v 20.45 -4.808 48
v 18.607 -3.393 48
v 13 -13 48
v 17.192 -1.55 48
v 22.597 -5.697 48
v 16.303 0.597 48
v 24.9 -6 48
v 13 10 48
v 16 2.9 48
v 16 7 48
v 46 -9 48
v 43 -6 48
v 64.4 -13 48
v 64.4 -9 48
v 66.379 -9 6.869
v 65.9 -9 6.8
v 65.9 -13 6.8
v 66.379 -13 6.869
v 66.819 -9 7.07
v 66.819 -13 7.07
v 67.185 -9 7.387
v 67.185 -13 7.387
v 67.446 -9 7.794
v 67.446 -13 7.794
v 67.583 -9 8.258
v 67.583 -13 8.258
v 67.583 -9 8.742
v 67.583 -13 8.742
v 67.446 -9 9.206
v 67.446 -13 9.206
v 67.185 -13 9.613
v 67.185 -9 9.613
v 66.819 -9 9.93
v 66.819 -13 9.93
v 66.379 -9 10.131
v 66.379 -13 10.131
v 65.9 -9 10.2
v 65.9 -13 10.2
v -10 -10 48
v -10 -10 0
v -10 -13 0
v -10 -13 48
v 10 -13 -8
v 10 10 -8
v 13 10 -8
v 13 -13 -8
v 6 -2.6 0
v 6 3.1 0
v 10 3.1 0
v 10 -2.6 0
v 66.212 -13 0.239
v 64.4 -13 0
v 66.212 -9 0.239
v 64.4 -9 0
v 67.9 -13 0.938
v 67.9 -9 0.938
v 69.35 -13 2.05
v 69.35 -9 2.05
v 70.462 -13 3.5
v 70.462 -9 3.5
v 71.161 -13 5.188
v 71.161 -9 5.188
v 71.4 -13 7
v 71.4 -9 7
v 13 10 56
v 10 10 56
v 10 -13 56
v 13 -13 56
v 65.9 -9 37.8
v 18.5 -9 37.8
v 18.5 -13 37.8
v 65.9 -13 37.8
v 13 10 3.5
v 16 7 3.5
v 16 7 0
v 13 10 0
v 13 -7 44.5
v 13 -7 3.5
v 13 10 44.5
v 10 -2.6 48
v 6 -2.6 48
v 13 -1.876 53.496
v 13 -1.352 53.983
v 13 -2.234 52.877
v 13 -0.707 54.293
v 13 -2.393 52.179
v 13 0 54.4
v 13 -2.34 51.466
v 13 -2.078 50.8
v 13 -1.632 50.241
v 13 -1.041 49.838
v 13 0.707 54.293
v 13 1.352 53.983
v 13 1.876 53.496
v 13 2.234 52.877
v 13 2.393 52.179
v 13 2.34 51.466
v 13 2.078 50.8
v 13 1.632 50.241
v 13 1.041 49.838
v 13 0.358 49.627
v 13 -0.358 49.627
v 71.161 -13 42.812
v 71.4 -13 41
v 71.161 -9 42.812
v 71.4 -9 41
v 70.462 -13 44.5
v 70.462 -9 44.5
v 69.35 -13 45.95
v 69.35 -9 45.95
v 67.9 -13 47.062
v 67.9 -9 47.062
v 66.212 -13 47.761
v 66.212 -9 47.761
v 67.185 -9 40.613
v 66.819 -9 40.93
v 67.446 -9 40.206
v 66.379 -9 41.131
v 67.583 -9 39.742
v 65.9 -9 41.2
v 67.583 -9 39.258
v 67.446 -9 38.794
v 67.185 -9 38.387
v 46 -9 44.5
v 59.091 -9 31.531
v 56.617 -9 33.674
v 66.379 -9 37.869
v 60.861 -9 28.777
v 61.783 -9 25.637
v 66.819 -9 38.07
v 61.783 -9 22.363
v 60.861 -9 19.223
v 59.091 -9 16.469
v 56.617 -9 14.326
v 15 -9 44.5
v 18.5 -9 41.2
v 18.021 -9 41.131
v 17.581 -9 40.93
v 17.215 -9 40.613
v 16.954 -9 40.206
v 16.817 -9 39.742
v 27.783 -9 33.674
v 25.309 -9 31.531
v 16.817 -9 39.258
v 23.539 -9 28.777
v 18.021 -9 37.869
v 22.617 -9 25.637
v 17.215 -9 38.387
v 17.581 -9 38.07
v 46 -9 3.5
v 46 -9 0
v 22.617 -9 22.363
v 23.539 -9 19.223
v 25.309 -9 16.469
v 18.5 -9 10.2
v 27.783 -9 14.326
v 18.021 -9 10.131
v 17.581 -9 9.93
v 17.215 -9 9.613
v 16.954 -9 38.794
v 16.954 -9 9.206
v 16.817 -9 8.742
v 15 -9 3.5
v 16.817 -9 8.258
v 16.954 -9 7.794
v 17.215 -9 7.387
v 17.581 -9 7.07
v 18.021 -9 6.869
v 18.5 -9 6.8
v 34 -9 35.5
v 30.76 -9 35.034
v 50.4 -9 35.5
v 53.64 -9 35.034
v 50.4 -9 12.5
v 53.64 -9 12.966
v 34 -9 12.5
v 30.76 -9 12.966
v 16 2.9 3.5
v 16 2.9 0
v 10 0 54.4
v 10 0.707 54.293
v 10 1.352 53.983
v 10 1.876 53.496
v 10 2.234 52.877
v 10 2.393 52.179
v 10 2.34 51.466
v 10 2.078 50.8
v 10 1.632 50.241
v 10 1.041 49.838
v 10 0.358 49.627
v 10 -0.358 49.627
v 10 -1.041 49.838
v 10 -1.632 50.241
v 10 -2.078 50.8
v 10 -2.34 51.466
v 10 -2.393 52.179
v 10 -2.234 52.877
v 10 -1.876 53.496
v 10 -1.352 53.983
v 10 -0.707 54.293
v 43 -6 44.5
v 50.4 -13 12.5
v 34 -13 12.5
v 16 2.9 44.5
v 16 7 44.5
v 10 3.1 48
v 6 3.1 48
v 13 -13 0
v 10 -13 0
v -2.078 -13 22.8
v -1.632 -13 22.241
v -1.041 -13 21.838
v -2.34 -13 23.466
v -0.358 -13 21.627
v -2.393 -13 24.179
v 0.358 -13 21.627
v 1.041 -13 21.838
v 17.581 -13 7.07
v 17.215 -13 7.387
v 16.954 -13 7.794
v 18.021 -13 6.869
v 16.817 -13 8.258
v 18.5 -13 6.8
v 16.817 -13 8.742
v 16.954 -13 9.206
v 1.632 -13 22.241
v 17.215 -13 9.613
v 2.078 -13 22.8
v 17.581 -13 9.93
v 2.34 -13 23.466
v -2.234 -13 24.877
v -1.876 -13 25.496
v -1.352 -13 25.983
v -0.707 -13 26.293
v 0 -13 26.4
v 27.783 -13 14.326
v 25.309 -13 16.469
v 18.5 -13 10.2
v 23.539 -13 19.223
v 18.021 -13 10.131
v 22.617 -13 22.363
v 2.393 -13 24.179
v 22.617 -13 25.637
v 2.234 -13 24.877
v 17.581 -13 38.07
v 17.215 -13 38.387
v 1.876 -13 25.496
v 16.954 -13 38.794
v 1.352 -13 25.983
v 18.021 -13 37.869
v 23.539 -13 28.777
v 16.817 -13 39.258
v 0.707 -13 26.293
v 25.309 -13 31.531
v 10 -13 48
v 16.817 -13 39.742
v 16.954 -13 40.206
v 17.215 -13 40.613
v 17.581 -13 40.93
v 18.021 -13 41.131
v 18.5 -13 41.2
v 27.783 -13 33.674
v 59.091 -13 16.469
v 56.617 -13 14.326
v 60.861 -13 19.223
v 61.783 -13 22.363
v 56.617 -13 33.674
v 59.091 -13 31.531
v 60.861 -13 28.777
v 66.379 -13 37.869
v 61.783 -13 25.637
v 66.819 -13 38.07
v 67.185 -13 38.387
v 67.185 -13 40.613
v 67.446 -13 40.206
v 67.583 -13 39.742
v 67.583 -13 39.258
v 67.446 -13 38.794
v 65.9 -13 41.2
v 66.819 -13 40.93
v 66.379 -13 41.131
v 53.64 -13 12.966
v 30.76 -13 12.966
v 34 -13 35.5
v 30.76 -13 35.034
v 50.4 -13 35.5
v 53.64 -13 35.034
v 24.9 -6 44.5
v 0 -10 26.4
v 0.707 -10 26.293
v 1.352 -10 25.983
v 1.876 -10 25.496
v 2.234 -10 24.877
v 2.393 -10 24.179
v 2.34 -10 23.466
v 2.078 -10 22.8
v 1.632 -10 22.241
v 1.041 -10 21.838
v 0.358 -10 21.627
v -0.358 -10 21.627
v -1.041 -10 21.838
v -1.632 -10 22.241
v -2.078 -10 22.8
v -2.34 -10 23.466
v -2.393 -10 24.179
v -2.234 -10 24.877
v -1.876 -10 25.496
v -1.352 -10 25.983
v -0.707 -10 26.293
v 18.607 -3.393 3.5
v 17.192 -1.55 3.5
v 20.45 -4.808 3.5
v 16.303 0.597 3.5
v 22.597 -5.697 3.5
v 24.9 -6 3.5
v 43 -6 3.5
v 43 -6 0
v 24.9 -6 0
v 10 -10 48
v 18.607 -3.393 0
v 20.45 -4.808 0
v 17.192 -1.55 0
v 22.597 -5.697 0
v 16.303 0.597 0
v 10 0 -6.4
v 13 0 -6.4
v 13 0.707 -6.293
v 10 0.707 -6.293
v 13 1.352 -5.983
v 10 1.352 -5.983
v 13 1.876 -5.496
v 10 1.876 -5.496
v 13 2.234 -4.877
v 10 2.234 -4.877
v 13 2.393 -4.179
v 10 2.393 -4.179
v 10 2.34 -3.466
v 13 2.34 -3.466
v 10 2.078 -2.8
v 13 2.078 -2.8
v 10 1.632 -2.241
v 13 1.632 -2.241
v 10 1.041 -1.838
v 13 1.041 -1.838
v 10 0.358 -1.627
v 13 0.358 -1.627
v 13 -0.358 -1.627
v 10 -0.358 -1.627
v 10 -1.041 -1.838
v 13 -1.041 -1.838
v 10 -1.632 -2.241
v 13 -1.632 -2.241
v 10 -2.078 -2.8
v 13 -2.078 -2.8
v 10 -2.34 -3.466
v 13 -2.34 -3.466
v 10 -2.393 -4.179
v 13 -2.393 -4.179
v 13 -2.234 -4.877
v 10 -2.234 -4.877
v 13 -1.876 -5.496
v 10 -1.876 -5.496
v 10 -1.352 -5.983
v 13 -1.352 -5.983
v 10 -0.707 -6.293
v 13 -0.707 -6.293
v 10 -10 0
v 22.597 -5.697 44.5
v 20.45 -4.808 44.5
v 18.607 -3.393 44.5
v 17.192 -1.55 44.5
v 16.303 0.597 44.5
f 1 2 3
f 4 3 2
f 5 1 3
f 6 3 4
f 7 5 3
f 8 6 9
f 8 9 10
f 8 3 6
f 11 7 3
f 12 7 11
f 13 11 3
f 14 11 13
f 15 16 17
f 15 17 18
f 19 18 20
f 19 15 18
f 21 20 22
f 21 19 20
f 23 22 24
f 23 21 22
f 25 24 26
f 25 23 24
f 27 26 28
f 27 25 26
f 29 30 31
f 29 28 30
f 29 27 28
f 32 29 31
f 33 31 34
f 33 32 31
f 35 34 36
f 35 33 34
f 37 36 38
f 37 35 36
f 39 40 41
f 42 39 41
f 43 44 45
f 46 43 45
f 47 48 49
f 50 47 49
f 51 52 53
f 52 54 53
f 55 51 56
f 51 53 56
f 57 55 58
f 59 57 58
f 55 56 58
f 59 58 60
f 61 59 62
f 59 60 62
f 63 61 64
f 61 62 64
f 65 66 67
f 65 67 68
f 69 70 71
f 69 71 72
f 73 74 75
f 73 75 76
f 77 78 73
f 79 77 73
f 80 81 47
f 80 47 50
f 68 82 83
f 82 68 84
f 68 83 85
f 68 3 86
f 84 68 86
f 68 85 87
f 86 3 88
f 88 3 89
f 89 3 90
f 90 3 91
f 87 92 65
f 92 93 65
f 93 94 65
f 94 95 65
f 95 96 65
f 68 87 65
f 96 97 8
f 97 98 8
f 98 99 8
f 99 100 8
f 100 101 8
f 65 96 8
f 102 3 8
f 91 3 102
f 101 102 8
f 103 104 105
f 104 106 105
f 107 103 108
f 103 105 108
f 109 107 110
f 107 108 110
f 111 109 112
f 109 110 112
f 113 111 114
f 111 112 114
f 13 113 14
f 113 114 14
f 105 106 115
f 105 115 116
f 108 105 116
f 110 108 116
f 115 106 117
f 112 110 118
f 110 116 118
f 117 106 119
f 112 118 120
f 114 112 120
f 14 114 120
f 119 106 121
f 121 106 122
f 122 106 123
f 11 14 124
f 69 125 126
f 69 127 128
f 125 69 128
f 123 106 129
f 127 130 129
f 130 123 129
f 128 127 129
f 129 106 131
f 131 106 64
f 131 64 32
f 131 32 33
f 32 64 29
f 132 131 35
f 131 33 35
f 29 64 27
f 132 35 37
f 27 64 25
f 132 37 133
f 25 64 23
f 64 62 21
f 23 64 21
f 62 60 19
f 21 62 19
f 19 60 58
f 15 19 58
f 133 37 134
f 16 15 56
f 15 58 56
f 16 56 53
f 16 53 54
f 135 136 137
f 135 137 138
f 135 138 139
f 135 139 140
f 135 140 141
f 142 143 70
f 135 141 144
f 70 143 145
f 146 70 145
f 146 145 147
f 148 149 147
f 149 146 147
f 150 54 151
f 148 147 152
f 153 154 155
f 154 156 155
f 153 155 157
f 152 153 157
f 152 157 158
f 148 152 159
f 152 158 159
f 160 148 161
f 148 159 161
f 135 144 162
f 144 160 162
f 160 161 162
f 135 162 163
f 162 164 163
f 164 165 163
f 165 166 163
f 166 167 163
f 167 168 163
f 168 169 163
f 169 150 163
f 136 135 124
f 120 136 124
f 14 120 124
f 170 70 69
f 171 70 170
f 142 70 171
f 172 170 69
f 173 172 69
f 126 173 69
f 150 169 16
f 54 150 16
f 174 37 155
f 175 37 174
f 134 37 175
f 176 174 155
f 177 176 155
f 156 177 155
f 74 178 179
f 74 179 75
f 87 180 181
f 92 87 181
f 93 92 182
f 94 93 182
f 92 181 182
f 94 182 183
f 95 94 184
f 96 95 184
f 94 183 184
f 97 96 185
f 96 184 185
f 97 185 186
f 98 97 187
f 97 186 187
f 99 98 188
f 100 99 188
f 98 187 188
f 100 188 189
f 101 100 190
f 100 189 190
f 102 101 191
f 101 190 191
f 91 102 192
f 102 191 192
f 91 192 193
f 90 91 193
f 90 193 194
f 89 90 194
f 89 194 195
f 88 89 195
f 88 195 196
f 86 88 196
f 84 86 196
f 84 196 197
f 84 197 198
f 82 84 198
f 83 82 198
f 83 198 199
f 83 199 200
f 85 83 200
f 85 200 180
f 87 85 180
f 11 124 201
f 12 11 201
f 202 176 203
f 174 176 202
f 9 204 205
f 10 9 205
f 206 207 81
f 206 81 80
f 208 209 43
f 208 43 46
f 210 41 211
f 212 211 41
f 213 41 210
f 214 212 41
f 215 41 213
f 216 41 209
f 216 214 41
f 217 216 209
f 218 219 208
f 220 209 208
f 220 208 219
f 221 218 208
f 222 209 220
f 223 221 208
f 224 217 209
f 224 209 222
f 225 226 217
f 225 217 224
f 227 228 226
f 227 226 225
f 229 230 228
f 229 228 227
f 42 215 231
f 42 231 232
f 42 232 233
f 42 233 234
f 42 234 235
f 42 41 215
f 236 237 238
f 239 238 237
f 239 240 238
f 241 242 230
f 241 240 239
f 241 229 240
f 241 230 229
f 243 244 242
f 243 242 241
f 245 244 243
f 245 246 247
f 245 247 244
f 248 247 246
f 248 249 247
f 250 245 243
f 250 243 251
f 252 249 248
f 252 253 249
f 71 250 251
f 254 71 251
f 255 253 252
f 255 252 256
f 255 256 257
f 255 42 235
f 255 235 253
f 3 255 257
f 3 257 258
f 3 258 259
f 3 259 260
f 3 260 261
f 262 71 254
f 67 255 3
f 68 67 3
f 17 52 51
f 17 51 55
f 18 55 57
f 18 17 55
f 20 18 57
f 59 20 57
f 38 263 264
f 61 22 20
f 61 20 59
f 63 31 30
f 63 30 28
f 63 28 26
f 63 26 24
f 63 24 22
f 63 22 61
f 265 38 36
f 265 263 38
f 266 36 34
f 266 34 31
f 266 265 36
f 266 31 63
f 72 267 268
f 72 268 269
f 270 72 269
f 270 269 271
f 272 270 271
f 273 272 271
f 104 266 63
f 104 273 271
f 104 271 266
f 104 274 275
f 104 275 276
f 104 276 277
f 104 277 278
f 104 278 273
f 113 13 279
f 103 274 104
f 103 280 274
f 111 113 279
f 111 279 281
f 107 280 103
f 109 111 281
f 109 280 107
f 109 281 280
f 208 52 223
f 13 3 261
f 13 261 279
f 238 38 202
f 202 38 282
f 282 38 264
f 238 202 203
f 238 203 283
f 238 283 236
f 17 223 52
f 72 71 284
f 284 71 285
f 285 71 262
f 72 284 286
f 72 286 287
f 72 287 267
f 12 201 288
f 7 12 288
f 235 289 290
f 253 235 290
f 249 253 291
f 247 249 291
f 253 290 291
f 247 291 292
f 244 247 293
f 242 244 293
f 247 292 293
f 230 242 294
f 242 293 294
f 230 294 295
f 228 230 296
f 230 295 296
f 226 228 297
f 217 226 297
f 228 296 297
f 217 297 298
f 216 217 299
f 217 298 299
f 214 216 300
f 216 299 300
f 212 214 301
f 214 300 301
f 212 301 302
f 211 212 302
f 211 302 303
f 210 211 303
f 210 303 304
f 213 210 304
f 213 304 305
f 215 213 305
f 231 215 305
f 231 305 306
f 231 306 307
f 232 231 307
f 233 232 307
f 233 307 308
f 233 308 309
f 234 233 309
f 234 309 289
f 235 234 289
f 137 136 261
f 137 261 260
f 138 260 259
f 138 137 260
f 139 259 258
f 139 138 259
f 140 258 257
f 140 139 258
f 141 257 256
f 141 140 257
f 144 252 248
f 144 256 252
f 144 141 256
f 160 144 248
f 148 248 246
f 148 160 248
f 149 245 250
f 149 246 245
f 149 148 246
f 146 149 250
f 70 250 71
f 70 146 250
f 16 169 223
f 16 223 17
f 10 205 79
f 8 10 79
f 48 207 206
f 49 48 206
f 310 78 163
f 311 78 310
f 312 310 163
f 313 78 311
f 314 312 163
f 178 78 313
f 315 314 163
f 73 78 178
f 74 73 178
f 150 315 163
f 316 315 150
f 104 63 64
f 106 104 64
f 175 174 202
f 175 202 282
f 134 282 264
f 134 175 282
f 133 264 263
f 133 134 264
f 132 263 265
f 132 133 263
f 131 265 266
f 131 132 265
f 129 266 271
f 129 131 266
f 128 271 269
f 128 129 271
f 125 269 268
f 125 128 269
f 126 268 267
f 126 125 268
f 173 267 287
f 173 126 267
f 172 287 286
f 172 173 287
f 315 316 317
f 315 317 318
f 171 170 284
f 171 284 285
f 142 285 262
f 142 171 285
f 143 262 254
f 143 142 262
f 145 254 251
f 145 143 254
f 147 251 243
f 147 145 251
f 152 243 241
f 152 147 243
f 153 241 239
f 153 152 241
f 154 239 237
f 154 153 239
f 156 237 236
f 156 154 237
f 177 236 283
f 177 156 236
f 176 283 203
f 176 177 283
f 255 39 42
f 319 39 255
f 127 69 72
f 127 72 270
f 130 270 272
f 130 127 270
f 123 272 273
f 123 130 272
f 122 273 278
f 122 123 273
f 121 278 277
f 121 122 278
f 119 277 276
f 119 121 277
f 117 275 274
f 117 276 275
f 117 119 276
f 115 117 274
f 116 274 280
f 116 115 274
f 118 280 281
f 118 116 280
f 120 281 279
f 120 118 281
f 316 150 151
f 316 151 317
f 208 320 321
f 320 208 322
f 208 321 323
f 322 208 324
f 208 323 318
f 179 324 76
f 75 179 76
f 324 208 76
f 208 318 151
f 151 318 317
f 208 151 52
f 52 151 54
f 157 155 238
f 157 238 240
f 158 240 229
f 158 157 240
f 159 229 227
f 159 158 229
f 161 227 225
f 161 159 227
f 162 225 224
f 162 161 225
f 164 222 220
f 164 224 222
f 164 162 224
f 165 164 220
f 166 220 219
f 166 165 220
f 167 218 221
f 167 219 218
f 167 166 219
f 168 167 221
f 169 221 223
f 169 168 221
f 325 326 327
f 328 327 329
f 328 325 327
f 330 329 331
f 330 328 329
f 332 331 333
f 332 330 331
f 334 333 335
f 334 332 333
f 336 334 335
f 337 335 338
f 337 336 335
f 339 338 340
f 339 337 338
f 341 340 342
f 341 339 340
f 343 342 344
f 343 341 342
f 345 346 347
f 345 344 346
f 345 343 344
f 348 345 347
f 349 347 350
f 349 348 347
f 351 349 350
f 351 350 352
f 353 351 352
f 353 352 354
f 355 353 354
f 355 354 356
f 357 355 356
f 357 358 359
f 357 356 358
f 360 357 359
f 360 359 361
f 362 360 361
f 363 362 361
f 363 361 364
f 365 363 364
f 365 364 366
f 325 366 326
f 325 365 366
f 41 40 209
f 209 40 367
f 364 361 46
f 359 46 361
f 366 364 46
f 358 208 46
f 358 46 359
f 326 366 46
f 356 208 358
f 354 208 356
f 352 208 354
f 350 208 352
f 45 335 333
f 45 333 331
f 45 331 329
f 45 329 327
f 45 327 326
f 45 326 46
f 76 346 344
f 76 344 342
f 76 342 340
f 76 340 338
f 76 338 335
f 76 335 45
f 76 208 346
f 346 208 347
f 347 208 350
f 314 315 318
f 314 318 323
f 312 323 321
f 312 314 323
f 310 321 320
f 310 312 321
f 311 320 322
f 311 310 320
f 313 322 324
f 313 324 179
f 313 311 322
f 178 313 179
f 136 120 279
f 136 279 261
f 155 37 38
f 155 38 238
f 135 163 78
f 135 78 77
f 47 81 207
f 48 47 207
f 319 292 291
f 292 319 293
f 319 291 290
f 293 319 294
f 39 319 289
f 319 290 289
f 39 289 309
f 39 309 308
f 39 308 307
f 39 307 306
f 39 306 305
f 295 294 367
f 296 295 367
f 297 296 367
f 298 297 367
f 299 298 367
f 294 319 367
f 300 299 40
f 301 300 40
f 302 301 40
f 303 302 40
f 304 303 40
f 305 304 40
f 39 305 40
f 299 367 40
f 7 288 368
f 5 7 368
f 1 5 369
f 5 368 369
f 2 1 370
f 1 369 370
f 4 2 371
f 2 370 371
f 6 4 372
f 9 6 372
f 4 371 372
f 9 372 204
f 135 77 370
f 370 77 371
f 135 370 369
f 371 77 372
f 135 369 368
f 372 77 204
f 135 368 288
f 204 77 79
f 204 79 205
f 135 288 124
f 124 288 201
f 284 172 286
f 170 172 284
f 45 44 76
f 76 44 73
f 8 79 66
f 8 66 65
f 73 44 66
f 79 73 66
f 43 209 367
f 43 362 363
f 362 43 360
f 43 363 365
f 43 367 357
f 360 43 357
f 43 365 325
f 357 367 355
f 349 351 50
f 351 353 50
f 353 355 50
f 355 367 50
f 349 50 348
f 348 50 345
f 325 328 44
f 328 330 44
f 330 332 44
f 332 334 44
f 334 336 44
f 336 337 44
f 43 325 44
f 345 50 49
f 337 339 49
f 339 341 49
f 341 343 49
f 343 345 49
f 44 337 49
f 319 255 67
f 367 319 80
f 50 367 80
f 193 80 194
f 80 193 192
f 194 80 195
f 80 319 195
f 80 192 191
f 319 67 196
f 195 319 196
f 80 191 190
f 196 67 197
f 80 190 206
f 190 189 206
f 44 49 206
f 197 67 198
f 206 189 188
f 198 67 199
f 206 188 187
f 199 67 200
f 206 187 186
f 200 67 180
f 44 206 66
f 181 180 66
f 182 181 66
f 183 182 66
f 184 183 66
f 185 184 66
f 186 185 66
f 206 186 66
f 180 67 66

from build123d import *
from OCP.BRepFilletAPI import BRepFilletAPI_MakeChamfer

# Parameters (mm, degrees)
EXTRUDE_1_DEPTH     = 48
SKETCH_3_R          = 2.4
CUT_EXTRUDE_2_DEPTH = 89.328704281
CUT_EXTRUDE_3_REACH = 90.108
CHAMFER_1_SIZE      = 0.2
FILLET_1_R          = 7
CUT_EXTRUDE_4_DEPTH = 88.011263639
FILLET_2_R          = 4
RIB_START           = -3.5
RIB_2_DEPTH         = 3.5
CHAMFER_2_SIZE      = 0.8
CHAMFER_2_SIZE2     = 0.291176187
CHAMFER_3_SIZE      = 0.8
CHAMFER_3_SIZE2     = 0.291176187
CHAMFER_4_SIZE      = 2
SKETCH_21_W         = 8.512208597
SKETCH_21_H         = 13.260826712
CUT_EXTRUDE_5_DEPTH = 88.011263639
SKETCH_22_W         = 4
SKETCH_22_H         = 5.7
EXTRUDE_4_DEPTH     = 48
SKETCH_23_W         = 3
SKETCH_23_H         = 23
EXTRUDE_5_DEPTH     = 8
SKETCH_25_R         = 2.4
CUT_EXTRUDE_6_DEPTH = 85.112781431


# Read off the part's stored shape, not the designer's step: 筋2
with BuildPart() as part:
    # 草图1 → 凸台-拉伸1 (new body)
    with BuildSketch(Plane.XY):
        Polygon((-10, -10), (-10, -13), (71.4, -13), (71.4, -9), (13, -9), (13, 10), (10, 10), (10, 2.95), (8, 2.95), (8, 4.75), (6.8, 4.75), (6, 3.95), (6, -3.95), (6.8, -4.75), (8, -4.75), (8, -2.95), (10, -2.95), (10, -10), align=None)
    extrude(amount=EXTRUDE_1_DEPTH)

    # 草图3 → 切除-拉伸2 (cut, through all)
    with BuildSketch(Plane(origin=(0, -10, 0), x_dir=(1, 0, 0), z_dir=(0, 1, 0))):
        with Locations(Location((0, -24, 0), (0, 0, 270))):
            Circle(SKETCH_3_R)
    extrude(amount=-CUT_EXTRUDE_2_DEPTH, mode=Mode.SUBTRACT)

    # 草图4 → 切除-拉伸3 (cut, up to next)
    with BuildSketch(Plane(origin=(0, -9, 0), x_dir=(1, 0, 0), z_dir=(0, 1, 0)), mode=Mode.PRIVATE) as cut_extrude_3_sk1:
        with BuildLine():
            Line((18.5, -6.8), (65.9, -6.8))
            ThreePointArc((65.9, -6.8), (67.6, -8.5), (65.9, -10.2))
            Line((65.9, -10.2), (18.5, -10.2))
            ThreePointArc((18.5, -10.2), (16.8, -8.5), (18.5, -6.8))
        make_face()
    cut_extrude_3_tool1 = extrude(cut_extrude_3_sk1.sketch, amount=-CUT_EXTRUDE_3_REACH, mode=Mode.PRIVATE) & part.part
    # 草图4 → 切除-拉伸3 (cut, up to next)
    with BuildSketch(Plane(origin=(0, -9, 0), x_dir=(1, 0, 0), z_dir=(0, 1, 0)), mode=Mode.PRIVATE) as cut_extrude_3_sk2:
        with BuildLine():
            Line((18.5, -37.8), (65.9, -37.8))
            ThreePointArc((65.9, -37.8), (67.6, -39.5), (65.9, -41.2))
            Line((65.9, -41.2), (18.5, -41.2))
            ThreePointArc((18.5, -41.2), (16.8, -39.5), (18.5, -37.8))
        make_face()
    cut_extrude_3_tool2 = extrude(cut_extrude_3_sk2.sketch, amount=-CUT_EXTRUDE_3_REACH, mode=Mode.PRIVATE) & part.part
    # 草图4 → 切除-拉伸3 (cut, up to next)
    with BuildSketch(Plane(origin=(0, -9, 0), x_dir=(1, 0, 0), z_dir=(0, 1, 0)), mode=Mode.PRIVATE) as cut_extrude_3_sk3:
        with BuildLine():
            Line((34, -12.5), (50.4, -12.5))
            ThreePointArc((50.4, -12.5), (61.9, -24), (50.4, -35.5))
            Line((50.4, -35.5), (34, -35.5))
            ThreePointArc((34, -35.5), (22.5, -24), (34, -12.5))
        make_face()
    cut_extrude_3_tool3 = extrude(cut_extrude_3_sk3.sketch, amount=-CUT_EXTRUDE_3_REACH, mode=Mode.PRIVATE) & part.part
    add(cut_extrude_3_tool1.solids().sort_by_distance((42.2, -9, 8.5))[0], mode=Mode.SUBTRACT)
    add(cut_extrude_3_tool2.solids().sort_by_distance((42.2, -9, 39.5))[0], mode=Mode.SUBTRACT)
    add(cut_extrude_3_tool3.solids().sort_by_distance((42.2, -9, 24))[0], mode=Mode.SUBTRACT)

    # 倒角1
    chamfer_1_edges = [part.edges().sort_by_distance(p)[0] for p in [
        (8, -2.95, 24),
        (8, -4.75, 24),
        (8, 4.75, 24),
        (8, 2.95, 24),
    ]]
    chamfer(chamfer_1_edges, length=CHAMFER_1_SIZE)

    # 圆角1
    fillet_1_edges = [part.edges().sort_by_distance(p)[0] for p in [
        (71.4, -11, 48),
        (71.4, -11, 0),
    ]]
    fillet(fillet_1_edges, radius=FILLET_1_R)

    # 草图11 → 切除-拉伸4 (cut, through all)
    with BuildSketch(Plane(origin=(0, 0, 0), x_dir=(-1, 0, 0), z_dir=(0, 0, -1))):
        Polygon((-10, -2.65), (-6, 0.706398525), (-6, -6.71507999), (-10, -6.71507999), align=None)
    extrude(amount=-CUT_EXTRUDE_4_DEPTH, mode=Mode.SUBTRACT)

    # 圆角2
    fillet_2_edges = [part.edges().sort_by_distance(p)[0] for p in [
        (6, 0.706398525, 24),
    ]]
    fillet(fillet_2_edges, radius=FILLET_2_R)

    # 筋2 outline → 筋2 (add)
    with BuildSketch(Plane.XY.offset(48).offset(RIB_START)):
        with BuildLine():
            Line((13, -9), (46, -9))
            Line((46, -9), (43, -6))
            Line((43, -6), (24.9, -6))
            ThreePointArc((24.9, -6), (18.606749647, -3.393250353), (16, 2.9))
            Line((16, 2.9), (16, 7))
            Line((16, 7), (13, 10))
            Line((13, 10), (13, -9))
        make_face()
    rib_2 = extrude(amount=RIB_2_DEPTH)

    # 镜向1: 筋2 across plane
    add(rib_2.mirror(Plane.XY.offset(24)))

    # 倒角2: one chamfer whose edges measure the first distance from different faces: ONE call of the kernel's chamfer builder (chamfer() names one face for all edges)
    chamfer_2_edges_1 = [part.edges().sort_by_distance(p)[0] for p in [
        (9.1, 2.95, 48),
    ]]
    chamfer_2_side_1 = [part.faces().sort_by_distance(p)[0] for p in [
        (9.1, 2.95, 24),
    ]]
    chamfer_2_edges_2 = [part.edges().sort_by_distance(p)[0] for p in [
        (8, 3.85, 48),
    ]]
    chamfer_2_side_2 = [part.faces().sort_by_distance(p)[0] for p in [
        (8, 3.85, 24),
    ]]
    chamfer_2_edges_3 = [part.edges().sort_by_distance(p)[0] for p in [
        (7.3, 4.75, 48),
    ]]
    chamfer_2_side_3 = [part.faces().sort_by_distance(p)[0] for p in [
        (7.3, 4.75, 24),
    ]]
    chamfer_2_edges_4 = [part.edges().sort_by_distance(p)[0] for p in [
        (7.9, 4.65, 48),
    ]]
    chamfer_2_side_4 = [part.faces().sort_by_distance(p)[0] for p in [
        (7.9, 4.65, 24),
    ]]
    chamfer_2_edges_5 = [part.edges().sort_by_distance(p)[0] for p in [
        (8.1, 3.05, 48),
    ]]
    chamfer_2_side_5 = [part.faces().sort_by_distance(p)[0] for p in [
        (8.1, 3.05, 24),
    ]]
    chamfer_2_edges_6 = [part.edges().sort_by_distance(p)[0] for p in [
        (8.714424781, -1.571274308, 48),
    ]]
    chamfer_2_side_6 = [part.faces().sort_by_distance(p)[0] for p in [
        (8.714424781, -1.571274308, 24),
    ]]
    chamfer_2_edges_7 = [part.edges().sort_by_distance(p)[0] for p in [
        (6.374768852, 0.88115611, 48),
    ]]
    chamfer_2_side_7 = [part.faces().sort_by_distance(p)[0] for p in [
        (6.374768852, 0.88115611, 24),
    ]]
    chamfer_2_edges_8 = [part.edges().sort_by_distance(p)[0] for p in [
        (6.4, 4.35, 48),
    ]]
    chamfer_2_side_8 = [part.faces().sort_by_distance(p)[0] for p in [
        (6.4, 4.35, 24),
    ]]
    chamfer_2_edges_9 = [part.edges().sort_by_distance(p)[0] for p in [
        (6, 3.260814579, 48),
    ]]
    chamfer_2_side_9 = [part.faces().sort_by_distance(p)[0] for p in [
        (6, 3.260814579, 24),
    ]]
    chamfer_2 = BRepFilletAPI_MakeChamfer(part.part.solid().wrapped)
    for e in chamfer_2_edges_1:
        chamfer_2.Add(CHAMFER_2_SIZE, CHAMFER_2_SIZE2, e.wrapped, chamfer_2_side_1[0].wrapped)  # the first distance lies on this face
    for e in chamfer_2_edges_2:
        chamfer_2.Add(CHAMFER_2_SIZE, CHAMFER_2_SIZE2, e.wrapped, chamfer_2_side_2[0].wrapped)  # the first distance lies on this face
    for e in chamfer_2_edges_3:
        chamfer_2.Add(CHAMFER_2_SIZE, CHAMFER_2_SIZE2, e.wrapped, chamfer_2_side_3[0].wrapped)  # the first distance lies on this face
    for e in chamfer_2_edges_4:
        chamfer_2.Add(CHAMFER_2_SIZE, CHAMFER_2_SIZE2, e.wrapped, chamfer_2_side_4[0].wrapped)  # the first distance lies on this face
    for e in chamfer_2_edges_5:
        chamfer_2.Add(CHAMFER_2_SIZE, CHAMFER_2_SIZE2, e.wrapped, chamfer_2_side_5[0].wrapped)  # the first distance lies on this face
    for e in chamfer_2_edges_6:
        chamfer_2.Add(CHAMFER_2_SIZE, CHAMFER_2_SIZE2, e.wrapped, chamfer_2_side_6[0].wrapped)  # the first distance lies on this face
    for e in chamfer_2_edges_7:
        chamfer_2.Add(CHAMFER_2_SIZE, CHAMFER_2_SIZE2, e.wrapped, chamfer_2_side_7[0].wrapped)  # the first distance lies on this face
    for e in chamfer_2_edges_8:
        chamfer_2.Add(CHAMFER_2_SIZE, CHAMFER_2_SIZE2, e.wrapped, chamfer_2_side_8[0].wrapped)  # the first distance lies on this face
    for e in chamfer_2_edges_9:
        chamfer_2.Add(CHAMFER_2_SIZE, CHAMFER_2_SIZE2, e.wrapped, chamfer_2_side_9[0].wrapped)  # the first distance lies on this face
    add(Compound.cast(chamfer_2.Shape()), mode=Mode.REPLACE)

    # 倒角3: one chamfer whose edges measure the first distance from different faces: ONE call of the kernel's chamfer builder (chamfer() names one face for all edges)
    chamfer_3_edges_1 = [part.edges().sort_by_distance(p)[0] for p in [
        (7.3, 4.75, 0),
    ]]
    chamfer_3_side_1 = [part.faces().sort_by_distance(p)[0] for p in [
        (7.3, 4.75, 23.6),
    ]]
    chamfer_3_edges_2 = [part.edges().sort_by_distance(p)[0] for p in [
        (8, 3.85, 0),
    ]]
    chamfer_3_side_2 = [part.faces().sort_by_distance(p)[0] for p in [
        (8, 3.85, 23.6),
    ]]
    chamfer_3_edges_3 = [part.edges().sort_by_distance(p)[0] for p in [
        (7.9, 4.65, 0),
    ]]
    chamfer_3_side_3 = [part.faces().sort_by_distance(p)[0] for p in [
        (7.9, 4.65, 23.6),
    ]]
    chamfer_3_edges_4 = [part.edges().sort_by_distance(p)[0] for p in [
        (8.1, 3.05, 0),
    ]]
    chamfer_3_side_4 = [part.faces().sort_by_distance(p)[0] for p in [
        (8.1, 3.05, 23.6),
    ]]
    chamfer_3_edges_5 = [part.edges().sort_by_distance(p)[0] for p in [
        (6, 3.260814579, 0),
    ]]
    chamfer_3_side_5 = [part.faces().sort_by_distance(p)[0] for p in [
        (6, 3.260814579, 23.6),
    ]]
    chamfer_3_edges_6 = [part.edges().sort_by_distance(p)[0] for p in [
        (6.4, 4.35, 0),
    ]]
    chamfer_3_side_6 = [part.faces().sort_by_distance(p)[0] for p in [
        (6.4, 4.35, 23.6),
    ]]
    chamfer_3_edges_7 = [part.edges().sort_by_distance(p)[0] for p in [
        (9.1, 2.95, 0),
    ]]
    chamfer_3_side_7 = [part.faces().sort_by_distance(p)[0] for p in [
        (9.1, 2.95, 23.6),
    ]]
    chamfer_3_edges_8 = [part.edges().sort_by_distance(p)[0] for p in [
        (8.714424781, -1.571274308, 0),
    ]]
    chamfer_3_side_8 = [part.faces().sort_by_distance(p)[0] for p in [
        (8.714424781, -1.571274308, 23.6),
    ]]
    chamfer_3_edges_9 = [part.edges().sort_by_distance(p)[0] for p in [
        (6.374768852, 0.88115611, 0),
    ]]
    chamfer_3_side_9 = [part.faces().sort_by_distance(p)[0] for p in [
        (6.374768852, 0.88115611, 23.6),
    ]]
    chamfer_3 = BRepFilletAPI_MakeChamfer(part.part.solid().wrapped)
    for e in chamfer_3_edges_1:
        chamfer_3.Add(CHAMFER_3_SIZE, CHAMFER_3_SIZE2, e.wrapped, chamfer_3_side_1[0].wrapped)  # the first distance lies on this face
    for e in chamfer_3_edges_2:
        chamfer_3.Add(CHAMFER_3_SIZE, CHAMFER_3_SIZE2, e.wrapped, chamfer_3_side_2[0].wrapped)  # the first distance lies on this face
    for e in chamfer_3_edges_3:
        chamfer_3.Add(CHAMFER_3_SIZE, CHAMFER_3_SIZE2, e.wrapped, chamfer_3_side_3[0].wrapped)  # the first distance lies on this face
    for e in chamfer_3_edges_4:
        chamfer_3.Add(CHAMFER_3_SIZE, CHAMFER_3_SIZE2, e.wrapped, chamfer_3_side_4[0].wrapped)  # the first distance lies on this face
    for e in chamfer_3_edges_5:
        chamfer_3.Add(CHAMFER_3_SIZE, CHAMFER_3_SIZE2, e.wrapped, chamfer_3_side_5[0].wrapped)  # the first distance lies on this face
    for e in chamfer_3_edges_6:
        chamfer_3.Add(CHAMFER_3_SIZE, CHAMFER_3_SIZE2, e.wrapped, chamfer_3_side_6[0].wrapped)  # the first distance lies on this face
    for e in chamfer_3_edges_7:
        chamfer_3.Add(CHAMFER_3_SIZE, CHAMFER_3_SIZE2, e.wrapped, chamfer_3_side_7[0].wrapped)  # the first distance lies on this face
    for e in chamfer_3_edges_8:
        chamfer_3.Add(CHAMFER_3_SIZE, CHAMFER_3_SIZE2, e.wrapped, chamfer_3_side_8[0].wrapped)  # the first distance lies on this face
    for e in chamfer_3_edges_9:
        chamfer_3.Add(CHAMFER_3_SIZE, CHAMFER_3_SIZE2, e.wrapped, chamfer_3_side_9[0].wrapped)  # the first distance lies on this face
    add(Compound.cast(chamfer_3.Shape()), mode=Mode.REPLACE)

    # 倒角4
    chamfer_4_edges = [part.edges().sort_by_distance(p)[0] for p in [
        (13, -9, 24),
    ]]
    chamfer(chamfer_4_edges, length=CHAMFER_4_SIZE)

    # 草图21 → 切除-拉伸5 (cut, through all)
    with BuildSketch(Plane.XY.offset(48)):
        with Locations((5.743895701, 1.572706777)):
            Rectangle(SKETCH_21_W, SKETCH_21_H)
    extrude(amount=-CUT_EXTRUDE_5_DEPTH, mode=Mode.SUBTRACT)

    # 草图22 → 凸台-拉伸4 (add)
    with BuildSketch(Plane.XY.offset(48)):
        with Locations((8, 0.25)):
            Rectangle(SKETCH_22_W, SKETCH_22_H)
    extrude(amount=-EXTRUDE_4_DEPTH)

    # 草图23 → 凸台-拉伸5 (add)
    with BuildSketch(Plane.XY.offset(48)):
        with Locations((11.5, -1.5)):
            Rectangle(SKETCH_23_W, SKETCH_23_H)
    extrude_5 = extrude(amount=EXTRUDE_5_DEPTH)

    # 草图25 → 切除-拉伸6 (cut, through all)
    with BuildSketch(Plane.ZY.offset(-10)):
        with Locations((52, 0)):
            Circle(SKETCH_25_R)
    cut_extrude_6 = extrude(amount=-CUT_EXTRUDE_6_DEPTH, mode=Mode.SUBTRACT)

    # 镜向2: 凸台-拉伸5, 切除-拉伸6 across plane
    add(extrude_5.mirror(Plane.XY.offset(24)))
    add(cut_extrude_6.mirror(Plane.XY.offset(24)), mode=Mode.SUBTRACT)


solid = part.part
